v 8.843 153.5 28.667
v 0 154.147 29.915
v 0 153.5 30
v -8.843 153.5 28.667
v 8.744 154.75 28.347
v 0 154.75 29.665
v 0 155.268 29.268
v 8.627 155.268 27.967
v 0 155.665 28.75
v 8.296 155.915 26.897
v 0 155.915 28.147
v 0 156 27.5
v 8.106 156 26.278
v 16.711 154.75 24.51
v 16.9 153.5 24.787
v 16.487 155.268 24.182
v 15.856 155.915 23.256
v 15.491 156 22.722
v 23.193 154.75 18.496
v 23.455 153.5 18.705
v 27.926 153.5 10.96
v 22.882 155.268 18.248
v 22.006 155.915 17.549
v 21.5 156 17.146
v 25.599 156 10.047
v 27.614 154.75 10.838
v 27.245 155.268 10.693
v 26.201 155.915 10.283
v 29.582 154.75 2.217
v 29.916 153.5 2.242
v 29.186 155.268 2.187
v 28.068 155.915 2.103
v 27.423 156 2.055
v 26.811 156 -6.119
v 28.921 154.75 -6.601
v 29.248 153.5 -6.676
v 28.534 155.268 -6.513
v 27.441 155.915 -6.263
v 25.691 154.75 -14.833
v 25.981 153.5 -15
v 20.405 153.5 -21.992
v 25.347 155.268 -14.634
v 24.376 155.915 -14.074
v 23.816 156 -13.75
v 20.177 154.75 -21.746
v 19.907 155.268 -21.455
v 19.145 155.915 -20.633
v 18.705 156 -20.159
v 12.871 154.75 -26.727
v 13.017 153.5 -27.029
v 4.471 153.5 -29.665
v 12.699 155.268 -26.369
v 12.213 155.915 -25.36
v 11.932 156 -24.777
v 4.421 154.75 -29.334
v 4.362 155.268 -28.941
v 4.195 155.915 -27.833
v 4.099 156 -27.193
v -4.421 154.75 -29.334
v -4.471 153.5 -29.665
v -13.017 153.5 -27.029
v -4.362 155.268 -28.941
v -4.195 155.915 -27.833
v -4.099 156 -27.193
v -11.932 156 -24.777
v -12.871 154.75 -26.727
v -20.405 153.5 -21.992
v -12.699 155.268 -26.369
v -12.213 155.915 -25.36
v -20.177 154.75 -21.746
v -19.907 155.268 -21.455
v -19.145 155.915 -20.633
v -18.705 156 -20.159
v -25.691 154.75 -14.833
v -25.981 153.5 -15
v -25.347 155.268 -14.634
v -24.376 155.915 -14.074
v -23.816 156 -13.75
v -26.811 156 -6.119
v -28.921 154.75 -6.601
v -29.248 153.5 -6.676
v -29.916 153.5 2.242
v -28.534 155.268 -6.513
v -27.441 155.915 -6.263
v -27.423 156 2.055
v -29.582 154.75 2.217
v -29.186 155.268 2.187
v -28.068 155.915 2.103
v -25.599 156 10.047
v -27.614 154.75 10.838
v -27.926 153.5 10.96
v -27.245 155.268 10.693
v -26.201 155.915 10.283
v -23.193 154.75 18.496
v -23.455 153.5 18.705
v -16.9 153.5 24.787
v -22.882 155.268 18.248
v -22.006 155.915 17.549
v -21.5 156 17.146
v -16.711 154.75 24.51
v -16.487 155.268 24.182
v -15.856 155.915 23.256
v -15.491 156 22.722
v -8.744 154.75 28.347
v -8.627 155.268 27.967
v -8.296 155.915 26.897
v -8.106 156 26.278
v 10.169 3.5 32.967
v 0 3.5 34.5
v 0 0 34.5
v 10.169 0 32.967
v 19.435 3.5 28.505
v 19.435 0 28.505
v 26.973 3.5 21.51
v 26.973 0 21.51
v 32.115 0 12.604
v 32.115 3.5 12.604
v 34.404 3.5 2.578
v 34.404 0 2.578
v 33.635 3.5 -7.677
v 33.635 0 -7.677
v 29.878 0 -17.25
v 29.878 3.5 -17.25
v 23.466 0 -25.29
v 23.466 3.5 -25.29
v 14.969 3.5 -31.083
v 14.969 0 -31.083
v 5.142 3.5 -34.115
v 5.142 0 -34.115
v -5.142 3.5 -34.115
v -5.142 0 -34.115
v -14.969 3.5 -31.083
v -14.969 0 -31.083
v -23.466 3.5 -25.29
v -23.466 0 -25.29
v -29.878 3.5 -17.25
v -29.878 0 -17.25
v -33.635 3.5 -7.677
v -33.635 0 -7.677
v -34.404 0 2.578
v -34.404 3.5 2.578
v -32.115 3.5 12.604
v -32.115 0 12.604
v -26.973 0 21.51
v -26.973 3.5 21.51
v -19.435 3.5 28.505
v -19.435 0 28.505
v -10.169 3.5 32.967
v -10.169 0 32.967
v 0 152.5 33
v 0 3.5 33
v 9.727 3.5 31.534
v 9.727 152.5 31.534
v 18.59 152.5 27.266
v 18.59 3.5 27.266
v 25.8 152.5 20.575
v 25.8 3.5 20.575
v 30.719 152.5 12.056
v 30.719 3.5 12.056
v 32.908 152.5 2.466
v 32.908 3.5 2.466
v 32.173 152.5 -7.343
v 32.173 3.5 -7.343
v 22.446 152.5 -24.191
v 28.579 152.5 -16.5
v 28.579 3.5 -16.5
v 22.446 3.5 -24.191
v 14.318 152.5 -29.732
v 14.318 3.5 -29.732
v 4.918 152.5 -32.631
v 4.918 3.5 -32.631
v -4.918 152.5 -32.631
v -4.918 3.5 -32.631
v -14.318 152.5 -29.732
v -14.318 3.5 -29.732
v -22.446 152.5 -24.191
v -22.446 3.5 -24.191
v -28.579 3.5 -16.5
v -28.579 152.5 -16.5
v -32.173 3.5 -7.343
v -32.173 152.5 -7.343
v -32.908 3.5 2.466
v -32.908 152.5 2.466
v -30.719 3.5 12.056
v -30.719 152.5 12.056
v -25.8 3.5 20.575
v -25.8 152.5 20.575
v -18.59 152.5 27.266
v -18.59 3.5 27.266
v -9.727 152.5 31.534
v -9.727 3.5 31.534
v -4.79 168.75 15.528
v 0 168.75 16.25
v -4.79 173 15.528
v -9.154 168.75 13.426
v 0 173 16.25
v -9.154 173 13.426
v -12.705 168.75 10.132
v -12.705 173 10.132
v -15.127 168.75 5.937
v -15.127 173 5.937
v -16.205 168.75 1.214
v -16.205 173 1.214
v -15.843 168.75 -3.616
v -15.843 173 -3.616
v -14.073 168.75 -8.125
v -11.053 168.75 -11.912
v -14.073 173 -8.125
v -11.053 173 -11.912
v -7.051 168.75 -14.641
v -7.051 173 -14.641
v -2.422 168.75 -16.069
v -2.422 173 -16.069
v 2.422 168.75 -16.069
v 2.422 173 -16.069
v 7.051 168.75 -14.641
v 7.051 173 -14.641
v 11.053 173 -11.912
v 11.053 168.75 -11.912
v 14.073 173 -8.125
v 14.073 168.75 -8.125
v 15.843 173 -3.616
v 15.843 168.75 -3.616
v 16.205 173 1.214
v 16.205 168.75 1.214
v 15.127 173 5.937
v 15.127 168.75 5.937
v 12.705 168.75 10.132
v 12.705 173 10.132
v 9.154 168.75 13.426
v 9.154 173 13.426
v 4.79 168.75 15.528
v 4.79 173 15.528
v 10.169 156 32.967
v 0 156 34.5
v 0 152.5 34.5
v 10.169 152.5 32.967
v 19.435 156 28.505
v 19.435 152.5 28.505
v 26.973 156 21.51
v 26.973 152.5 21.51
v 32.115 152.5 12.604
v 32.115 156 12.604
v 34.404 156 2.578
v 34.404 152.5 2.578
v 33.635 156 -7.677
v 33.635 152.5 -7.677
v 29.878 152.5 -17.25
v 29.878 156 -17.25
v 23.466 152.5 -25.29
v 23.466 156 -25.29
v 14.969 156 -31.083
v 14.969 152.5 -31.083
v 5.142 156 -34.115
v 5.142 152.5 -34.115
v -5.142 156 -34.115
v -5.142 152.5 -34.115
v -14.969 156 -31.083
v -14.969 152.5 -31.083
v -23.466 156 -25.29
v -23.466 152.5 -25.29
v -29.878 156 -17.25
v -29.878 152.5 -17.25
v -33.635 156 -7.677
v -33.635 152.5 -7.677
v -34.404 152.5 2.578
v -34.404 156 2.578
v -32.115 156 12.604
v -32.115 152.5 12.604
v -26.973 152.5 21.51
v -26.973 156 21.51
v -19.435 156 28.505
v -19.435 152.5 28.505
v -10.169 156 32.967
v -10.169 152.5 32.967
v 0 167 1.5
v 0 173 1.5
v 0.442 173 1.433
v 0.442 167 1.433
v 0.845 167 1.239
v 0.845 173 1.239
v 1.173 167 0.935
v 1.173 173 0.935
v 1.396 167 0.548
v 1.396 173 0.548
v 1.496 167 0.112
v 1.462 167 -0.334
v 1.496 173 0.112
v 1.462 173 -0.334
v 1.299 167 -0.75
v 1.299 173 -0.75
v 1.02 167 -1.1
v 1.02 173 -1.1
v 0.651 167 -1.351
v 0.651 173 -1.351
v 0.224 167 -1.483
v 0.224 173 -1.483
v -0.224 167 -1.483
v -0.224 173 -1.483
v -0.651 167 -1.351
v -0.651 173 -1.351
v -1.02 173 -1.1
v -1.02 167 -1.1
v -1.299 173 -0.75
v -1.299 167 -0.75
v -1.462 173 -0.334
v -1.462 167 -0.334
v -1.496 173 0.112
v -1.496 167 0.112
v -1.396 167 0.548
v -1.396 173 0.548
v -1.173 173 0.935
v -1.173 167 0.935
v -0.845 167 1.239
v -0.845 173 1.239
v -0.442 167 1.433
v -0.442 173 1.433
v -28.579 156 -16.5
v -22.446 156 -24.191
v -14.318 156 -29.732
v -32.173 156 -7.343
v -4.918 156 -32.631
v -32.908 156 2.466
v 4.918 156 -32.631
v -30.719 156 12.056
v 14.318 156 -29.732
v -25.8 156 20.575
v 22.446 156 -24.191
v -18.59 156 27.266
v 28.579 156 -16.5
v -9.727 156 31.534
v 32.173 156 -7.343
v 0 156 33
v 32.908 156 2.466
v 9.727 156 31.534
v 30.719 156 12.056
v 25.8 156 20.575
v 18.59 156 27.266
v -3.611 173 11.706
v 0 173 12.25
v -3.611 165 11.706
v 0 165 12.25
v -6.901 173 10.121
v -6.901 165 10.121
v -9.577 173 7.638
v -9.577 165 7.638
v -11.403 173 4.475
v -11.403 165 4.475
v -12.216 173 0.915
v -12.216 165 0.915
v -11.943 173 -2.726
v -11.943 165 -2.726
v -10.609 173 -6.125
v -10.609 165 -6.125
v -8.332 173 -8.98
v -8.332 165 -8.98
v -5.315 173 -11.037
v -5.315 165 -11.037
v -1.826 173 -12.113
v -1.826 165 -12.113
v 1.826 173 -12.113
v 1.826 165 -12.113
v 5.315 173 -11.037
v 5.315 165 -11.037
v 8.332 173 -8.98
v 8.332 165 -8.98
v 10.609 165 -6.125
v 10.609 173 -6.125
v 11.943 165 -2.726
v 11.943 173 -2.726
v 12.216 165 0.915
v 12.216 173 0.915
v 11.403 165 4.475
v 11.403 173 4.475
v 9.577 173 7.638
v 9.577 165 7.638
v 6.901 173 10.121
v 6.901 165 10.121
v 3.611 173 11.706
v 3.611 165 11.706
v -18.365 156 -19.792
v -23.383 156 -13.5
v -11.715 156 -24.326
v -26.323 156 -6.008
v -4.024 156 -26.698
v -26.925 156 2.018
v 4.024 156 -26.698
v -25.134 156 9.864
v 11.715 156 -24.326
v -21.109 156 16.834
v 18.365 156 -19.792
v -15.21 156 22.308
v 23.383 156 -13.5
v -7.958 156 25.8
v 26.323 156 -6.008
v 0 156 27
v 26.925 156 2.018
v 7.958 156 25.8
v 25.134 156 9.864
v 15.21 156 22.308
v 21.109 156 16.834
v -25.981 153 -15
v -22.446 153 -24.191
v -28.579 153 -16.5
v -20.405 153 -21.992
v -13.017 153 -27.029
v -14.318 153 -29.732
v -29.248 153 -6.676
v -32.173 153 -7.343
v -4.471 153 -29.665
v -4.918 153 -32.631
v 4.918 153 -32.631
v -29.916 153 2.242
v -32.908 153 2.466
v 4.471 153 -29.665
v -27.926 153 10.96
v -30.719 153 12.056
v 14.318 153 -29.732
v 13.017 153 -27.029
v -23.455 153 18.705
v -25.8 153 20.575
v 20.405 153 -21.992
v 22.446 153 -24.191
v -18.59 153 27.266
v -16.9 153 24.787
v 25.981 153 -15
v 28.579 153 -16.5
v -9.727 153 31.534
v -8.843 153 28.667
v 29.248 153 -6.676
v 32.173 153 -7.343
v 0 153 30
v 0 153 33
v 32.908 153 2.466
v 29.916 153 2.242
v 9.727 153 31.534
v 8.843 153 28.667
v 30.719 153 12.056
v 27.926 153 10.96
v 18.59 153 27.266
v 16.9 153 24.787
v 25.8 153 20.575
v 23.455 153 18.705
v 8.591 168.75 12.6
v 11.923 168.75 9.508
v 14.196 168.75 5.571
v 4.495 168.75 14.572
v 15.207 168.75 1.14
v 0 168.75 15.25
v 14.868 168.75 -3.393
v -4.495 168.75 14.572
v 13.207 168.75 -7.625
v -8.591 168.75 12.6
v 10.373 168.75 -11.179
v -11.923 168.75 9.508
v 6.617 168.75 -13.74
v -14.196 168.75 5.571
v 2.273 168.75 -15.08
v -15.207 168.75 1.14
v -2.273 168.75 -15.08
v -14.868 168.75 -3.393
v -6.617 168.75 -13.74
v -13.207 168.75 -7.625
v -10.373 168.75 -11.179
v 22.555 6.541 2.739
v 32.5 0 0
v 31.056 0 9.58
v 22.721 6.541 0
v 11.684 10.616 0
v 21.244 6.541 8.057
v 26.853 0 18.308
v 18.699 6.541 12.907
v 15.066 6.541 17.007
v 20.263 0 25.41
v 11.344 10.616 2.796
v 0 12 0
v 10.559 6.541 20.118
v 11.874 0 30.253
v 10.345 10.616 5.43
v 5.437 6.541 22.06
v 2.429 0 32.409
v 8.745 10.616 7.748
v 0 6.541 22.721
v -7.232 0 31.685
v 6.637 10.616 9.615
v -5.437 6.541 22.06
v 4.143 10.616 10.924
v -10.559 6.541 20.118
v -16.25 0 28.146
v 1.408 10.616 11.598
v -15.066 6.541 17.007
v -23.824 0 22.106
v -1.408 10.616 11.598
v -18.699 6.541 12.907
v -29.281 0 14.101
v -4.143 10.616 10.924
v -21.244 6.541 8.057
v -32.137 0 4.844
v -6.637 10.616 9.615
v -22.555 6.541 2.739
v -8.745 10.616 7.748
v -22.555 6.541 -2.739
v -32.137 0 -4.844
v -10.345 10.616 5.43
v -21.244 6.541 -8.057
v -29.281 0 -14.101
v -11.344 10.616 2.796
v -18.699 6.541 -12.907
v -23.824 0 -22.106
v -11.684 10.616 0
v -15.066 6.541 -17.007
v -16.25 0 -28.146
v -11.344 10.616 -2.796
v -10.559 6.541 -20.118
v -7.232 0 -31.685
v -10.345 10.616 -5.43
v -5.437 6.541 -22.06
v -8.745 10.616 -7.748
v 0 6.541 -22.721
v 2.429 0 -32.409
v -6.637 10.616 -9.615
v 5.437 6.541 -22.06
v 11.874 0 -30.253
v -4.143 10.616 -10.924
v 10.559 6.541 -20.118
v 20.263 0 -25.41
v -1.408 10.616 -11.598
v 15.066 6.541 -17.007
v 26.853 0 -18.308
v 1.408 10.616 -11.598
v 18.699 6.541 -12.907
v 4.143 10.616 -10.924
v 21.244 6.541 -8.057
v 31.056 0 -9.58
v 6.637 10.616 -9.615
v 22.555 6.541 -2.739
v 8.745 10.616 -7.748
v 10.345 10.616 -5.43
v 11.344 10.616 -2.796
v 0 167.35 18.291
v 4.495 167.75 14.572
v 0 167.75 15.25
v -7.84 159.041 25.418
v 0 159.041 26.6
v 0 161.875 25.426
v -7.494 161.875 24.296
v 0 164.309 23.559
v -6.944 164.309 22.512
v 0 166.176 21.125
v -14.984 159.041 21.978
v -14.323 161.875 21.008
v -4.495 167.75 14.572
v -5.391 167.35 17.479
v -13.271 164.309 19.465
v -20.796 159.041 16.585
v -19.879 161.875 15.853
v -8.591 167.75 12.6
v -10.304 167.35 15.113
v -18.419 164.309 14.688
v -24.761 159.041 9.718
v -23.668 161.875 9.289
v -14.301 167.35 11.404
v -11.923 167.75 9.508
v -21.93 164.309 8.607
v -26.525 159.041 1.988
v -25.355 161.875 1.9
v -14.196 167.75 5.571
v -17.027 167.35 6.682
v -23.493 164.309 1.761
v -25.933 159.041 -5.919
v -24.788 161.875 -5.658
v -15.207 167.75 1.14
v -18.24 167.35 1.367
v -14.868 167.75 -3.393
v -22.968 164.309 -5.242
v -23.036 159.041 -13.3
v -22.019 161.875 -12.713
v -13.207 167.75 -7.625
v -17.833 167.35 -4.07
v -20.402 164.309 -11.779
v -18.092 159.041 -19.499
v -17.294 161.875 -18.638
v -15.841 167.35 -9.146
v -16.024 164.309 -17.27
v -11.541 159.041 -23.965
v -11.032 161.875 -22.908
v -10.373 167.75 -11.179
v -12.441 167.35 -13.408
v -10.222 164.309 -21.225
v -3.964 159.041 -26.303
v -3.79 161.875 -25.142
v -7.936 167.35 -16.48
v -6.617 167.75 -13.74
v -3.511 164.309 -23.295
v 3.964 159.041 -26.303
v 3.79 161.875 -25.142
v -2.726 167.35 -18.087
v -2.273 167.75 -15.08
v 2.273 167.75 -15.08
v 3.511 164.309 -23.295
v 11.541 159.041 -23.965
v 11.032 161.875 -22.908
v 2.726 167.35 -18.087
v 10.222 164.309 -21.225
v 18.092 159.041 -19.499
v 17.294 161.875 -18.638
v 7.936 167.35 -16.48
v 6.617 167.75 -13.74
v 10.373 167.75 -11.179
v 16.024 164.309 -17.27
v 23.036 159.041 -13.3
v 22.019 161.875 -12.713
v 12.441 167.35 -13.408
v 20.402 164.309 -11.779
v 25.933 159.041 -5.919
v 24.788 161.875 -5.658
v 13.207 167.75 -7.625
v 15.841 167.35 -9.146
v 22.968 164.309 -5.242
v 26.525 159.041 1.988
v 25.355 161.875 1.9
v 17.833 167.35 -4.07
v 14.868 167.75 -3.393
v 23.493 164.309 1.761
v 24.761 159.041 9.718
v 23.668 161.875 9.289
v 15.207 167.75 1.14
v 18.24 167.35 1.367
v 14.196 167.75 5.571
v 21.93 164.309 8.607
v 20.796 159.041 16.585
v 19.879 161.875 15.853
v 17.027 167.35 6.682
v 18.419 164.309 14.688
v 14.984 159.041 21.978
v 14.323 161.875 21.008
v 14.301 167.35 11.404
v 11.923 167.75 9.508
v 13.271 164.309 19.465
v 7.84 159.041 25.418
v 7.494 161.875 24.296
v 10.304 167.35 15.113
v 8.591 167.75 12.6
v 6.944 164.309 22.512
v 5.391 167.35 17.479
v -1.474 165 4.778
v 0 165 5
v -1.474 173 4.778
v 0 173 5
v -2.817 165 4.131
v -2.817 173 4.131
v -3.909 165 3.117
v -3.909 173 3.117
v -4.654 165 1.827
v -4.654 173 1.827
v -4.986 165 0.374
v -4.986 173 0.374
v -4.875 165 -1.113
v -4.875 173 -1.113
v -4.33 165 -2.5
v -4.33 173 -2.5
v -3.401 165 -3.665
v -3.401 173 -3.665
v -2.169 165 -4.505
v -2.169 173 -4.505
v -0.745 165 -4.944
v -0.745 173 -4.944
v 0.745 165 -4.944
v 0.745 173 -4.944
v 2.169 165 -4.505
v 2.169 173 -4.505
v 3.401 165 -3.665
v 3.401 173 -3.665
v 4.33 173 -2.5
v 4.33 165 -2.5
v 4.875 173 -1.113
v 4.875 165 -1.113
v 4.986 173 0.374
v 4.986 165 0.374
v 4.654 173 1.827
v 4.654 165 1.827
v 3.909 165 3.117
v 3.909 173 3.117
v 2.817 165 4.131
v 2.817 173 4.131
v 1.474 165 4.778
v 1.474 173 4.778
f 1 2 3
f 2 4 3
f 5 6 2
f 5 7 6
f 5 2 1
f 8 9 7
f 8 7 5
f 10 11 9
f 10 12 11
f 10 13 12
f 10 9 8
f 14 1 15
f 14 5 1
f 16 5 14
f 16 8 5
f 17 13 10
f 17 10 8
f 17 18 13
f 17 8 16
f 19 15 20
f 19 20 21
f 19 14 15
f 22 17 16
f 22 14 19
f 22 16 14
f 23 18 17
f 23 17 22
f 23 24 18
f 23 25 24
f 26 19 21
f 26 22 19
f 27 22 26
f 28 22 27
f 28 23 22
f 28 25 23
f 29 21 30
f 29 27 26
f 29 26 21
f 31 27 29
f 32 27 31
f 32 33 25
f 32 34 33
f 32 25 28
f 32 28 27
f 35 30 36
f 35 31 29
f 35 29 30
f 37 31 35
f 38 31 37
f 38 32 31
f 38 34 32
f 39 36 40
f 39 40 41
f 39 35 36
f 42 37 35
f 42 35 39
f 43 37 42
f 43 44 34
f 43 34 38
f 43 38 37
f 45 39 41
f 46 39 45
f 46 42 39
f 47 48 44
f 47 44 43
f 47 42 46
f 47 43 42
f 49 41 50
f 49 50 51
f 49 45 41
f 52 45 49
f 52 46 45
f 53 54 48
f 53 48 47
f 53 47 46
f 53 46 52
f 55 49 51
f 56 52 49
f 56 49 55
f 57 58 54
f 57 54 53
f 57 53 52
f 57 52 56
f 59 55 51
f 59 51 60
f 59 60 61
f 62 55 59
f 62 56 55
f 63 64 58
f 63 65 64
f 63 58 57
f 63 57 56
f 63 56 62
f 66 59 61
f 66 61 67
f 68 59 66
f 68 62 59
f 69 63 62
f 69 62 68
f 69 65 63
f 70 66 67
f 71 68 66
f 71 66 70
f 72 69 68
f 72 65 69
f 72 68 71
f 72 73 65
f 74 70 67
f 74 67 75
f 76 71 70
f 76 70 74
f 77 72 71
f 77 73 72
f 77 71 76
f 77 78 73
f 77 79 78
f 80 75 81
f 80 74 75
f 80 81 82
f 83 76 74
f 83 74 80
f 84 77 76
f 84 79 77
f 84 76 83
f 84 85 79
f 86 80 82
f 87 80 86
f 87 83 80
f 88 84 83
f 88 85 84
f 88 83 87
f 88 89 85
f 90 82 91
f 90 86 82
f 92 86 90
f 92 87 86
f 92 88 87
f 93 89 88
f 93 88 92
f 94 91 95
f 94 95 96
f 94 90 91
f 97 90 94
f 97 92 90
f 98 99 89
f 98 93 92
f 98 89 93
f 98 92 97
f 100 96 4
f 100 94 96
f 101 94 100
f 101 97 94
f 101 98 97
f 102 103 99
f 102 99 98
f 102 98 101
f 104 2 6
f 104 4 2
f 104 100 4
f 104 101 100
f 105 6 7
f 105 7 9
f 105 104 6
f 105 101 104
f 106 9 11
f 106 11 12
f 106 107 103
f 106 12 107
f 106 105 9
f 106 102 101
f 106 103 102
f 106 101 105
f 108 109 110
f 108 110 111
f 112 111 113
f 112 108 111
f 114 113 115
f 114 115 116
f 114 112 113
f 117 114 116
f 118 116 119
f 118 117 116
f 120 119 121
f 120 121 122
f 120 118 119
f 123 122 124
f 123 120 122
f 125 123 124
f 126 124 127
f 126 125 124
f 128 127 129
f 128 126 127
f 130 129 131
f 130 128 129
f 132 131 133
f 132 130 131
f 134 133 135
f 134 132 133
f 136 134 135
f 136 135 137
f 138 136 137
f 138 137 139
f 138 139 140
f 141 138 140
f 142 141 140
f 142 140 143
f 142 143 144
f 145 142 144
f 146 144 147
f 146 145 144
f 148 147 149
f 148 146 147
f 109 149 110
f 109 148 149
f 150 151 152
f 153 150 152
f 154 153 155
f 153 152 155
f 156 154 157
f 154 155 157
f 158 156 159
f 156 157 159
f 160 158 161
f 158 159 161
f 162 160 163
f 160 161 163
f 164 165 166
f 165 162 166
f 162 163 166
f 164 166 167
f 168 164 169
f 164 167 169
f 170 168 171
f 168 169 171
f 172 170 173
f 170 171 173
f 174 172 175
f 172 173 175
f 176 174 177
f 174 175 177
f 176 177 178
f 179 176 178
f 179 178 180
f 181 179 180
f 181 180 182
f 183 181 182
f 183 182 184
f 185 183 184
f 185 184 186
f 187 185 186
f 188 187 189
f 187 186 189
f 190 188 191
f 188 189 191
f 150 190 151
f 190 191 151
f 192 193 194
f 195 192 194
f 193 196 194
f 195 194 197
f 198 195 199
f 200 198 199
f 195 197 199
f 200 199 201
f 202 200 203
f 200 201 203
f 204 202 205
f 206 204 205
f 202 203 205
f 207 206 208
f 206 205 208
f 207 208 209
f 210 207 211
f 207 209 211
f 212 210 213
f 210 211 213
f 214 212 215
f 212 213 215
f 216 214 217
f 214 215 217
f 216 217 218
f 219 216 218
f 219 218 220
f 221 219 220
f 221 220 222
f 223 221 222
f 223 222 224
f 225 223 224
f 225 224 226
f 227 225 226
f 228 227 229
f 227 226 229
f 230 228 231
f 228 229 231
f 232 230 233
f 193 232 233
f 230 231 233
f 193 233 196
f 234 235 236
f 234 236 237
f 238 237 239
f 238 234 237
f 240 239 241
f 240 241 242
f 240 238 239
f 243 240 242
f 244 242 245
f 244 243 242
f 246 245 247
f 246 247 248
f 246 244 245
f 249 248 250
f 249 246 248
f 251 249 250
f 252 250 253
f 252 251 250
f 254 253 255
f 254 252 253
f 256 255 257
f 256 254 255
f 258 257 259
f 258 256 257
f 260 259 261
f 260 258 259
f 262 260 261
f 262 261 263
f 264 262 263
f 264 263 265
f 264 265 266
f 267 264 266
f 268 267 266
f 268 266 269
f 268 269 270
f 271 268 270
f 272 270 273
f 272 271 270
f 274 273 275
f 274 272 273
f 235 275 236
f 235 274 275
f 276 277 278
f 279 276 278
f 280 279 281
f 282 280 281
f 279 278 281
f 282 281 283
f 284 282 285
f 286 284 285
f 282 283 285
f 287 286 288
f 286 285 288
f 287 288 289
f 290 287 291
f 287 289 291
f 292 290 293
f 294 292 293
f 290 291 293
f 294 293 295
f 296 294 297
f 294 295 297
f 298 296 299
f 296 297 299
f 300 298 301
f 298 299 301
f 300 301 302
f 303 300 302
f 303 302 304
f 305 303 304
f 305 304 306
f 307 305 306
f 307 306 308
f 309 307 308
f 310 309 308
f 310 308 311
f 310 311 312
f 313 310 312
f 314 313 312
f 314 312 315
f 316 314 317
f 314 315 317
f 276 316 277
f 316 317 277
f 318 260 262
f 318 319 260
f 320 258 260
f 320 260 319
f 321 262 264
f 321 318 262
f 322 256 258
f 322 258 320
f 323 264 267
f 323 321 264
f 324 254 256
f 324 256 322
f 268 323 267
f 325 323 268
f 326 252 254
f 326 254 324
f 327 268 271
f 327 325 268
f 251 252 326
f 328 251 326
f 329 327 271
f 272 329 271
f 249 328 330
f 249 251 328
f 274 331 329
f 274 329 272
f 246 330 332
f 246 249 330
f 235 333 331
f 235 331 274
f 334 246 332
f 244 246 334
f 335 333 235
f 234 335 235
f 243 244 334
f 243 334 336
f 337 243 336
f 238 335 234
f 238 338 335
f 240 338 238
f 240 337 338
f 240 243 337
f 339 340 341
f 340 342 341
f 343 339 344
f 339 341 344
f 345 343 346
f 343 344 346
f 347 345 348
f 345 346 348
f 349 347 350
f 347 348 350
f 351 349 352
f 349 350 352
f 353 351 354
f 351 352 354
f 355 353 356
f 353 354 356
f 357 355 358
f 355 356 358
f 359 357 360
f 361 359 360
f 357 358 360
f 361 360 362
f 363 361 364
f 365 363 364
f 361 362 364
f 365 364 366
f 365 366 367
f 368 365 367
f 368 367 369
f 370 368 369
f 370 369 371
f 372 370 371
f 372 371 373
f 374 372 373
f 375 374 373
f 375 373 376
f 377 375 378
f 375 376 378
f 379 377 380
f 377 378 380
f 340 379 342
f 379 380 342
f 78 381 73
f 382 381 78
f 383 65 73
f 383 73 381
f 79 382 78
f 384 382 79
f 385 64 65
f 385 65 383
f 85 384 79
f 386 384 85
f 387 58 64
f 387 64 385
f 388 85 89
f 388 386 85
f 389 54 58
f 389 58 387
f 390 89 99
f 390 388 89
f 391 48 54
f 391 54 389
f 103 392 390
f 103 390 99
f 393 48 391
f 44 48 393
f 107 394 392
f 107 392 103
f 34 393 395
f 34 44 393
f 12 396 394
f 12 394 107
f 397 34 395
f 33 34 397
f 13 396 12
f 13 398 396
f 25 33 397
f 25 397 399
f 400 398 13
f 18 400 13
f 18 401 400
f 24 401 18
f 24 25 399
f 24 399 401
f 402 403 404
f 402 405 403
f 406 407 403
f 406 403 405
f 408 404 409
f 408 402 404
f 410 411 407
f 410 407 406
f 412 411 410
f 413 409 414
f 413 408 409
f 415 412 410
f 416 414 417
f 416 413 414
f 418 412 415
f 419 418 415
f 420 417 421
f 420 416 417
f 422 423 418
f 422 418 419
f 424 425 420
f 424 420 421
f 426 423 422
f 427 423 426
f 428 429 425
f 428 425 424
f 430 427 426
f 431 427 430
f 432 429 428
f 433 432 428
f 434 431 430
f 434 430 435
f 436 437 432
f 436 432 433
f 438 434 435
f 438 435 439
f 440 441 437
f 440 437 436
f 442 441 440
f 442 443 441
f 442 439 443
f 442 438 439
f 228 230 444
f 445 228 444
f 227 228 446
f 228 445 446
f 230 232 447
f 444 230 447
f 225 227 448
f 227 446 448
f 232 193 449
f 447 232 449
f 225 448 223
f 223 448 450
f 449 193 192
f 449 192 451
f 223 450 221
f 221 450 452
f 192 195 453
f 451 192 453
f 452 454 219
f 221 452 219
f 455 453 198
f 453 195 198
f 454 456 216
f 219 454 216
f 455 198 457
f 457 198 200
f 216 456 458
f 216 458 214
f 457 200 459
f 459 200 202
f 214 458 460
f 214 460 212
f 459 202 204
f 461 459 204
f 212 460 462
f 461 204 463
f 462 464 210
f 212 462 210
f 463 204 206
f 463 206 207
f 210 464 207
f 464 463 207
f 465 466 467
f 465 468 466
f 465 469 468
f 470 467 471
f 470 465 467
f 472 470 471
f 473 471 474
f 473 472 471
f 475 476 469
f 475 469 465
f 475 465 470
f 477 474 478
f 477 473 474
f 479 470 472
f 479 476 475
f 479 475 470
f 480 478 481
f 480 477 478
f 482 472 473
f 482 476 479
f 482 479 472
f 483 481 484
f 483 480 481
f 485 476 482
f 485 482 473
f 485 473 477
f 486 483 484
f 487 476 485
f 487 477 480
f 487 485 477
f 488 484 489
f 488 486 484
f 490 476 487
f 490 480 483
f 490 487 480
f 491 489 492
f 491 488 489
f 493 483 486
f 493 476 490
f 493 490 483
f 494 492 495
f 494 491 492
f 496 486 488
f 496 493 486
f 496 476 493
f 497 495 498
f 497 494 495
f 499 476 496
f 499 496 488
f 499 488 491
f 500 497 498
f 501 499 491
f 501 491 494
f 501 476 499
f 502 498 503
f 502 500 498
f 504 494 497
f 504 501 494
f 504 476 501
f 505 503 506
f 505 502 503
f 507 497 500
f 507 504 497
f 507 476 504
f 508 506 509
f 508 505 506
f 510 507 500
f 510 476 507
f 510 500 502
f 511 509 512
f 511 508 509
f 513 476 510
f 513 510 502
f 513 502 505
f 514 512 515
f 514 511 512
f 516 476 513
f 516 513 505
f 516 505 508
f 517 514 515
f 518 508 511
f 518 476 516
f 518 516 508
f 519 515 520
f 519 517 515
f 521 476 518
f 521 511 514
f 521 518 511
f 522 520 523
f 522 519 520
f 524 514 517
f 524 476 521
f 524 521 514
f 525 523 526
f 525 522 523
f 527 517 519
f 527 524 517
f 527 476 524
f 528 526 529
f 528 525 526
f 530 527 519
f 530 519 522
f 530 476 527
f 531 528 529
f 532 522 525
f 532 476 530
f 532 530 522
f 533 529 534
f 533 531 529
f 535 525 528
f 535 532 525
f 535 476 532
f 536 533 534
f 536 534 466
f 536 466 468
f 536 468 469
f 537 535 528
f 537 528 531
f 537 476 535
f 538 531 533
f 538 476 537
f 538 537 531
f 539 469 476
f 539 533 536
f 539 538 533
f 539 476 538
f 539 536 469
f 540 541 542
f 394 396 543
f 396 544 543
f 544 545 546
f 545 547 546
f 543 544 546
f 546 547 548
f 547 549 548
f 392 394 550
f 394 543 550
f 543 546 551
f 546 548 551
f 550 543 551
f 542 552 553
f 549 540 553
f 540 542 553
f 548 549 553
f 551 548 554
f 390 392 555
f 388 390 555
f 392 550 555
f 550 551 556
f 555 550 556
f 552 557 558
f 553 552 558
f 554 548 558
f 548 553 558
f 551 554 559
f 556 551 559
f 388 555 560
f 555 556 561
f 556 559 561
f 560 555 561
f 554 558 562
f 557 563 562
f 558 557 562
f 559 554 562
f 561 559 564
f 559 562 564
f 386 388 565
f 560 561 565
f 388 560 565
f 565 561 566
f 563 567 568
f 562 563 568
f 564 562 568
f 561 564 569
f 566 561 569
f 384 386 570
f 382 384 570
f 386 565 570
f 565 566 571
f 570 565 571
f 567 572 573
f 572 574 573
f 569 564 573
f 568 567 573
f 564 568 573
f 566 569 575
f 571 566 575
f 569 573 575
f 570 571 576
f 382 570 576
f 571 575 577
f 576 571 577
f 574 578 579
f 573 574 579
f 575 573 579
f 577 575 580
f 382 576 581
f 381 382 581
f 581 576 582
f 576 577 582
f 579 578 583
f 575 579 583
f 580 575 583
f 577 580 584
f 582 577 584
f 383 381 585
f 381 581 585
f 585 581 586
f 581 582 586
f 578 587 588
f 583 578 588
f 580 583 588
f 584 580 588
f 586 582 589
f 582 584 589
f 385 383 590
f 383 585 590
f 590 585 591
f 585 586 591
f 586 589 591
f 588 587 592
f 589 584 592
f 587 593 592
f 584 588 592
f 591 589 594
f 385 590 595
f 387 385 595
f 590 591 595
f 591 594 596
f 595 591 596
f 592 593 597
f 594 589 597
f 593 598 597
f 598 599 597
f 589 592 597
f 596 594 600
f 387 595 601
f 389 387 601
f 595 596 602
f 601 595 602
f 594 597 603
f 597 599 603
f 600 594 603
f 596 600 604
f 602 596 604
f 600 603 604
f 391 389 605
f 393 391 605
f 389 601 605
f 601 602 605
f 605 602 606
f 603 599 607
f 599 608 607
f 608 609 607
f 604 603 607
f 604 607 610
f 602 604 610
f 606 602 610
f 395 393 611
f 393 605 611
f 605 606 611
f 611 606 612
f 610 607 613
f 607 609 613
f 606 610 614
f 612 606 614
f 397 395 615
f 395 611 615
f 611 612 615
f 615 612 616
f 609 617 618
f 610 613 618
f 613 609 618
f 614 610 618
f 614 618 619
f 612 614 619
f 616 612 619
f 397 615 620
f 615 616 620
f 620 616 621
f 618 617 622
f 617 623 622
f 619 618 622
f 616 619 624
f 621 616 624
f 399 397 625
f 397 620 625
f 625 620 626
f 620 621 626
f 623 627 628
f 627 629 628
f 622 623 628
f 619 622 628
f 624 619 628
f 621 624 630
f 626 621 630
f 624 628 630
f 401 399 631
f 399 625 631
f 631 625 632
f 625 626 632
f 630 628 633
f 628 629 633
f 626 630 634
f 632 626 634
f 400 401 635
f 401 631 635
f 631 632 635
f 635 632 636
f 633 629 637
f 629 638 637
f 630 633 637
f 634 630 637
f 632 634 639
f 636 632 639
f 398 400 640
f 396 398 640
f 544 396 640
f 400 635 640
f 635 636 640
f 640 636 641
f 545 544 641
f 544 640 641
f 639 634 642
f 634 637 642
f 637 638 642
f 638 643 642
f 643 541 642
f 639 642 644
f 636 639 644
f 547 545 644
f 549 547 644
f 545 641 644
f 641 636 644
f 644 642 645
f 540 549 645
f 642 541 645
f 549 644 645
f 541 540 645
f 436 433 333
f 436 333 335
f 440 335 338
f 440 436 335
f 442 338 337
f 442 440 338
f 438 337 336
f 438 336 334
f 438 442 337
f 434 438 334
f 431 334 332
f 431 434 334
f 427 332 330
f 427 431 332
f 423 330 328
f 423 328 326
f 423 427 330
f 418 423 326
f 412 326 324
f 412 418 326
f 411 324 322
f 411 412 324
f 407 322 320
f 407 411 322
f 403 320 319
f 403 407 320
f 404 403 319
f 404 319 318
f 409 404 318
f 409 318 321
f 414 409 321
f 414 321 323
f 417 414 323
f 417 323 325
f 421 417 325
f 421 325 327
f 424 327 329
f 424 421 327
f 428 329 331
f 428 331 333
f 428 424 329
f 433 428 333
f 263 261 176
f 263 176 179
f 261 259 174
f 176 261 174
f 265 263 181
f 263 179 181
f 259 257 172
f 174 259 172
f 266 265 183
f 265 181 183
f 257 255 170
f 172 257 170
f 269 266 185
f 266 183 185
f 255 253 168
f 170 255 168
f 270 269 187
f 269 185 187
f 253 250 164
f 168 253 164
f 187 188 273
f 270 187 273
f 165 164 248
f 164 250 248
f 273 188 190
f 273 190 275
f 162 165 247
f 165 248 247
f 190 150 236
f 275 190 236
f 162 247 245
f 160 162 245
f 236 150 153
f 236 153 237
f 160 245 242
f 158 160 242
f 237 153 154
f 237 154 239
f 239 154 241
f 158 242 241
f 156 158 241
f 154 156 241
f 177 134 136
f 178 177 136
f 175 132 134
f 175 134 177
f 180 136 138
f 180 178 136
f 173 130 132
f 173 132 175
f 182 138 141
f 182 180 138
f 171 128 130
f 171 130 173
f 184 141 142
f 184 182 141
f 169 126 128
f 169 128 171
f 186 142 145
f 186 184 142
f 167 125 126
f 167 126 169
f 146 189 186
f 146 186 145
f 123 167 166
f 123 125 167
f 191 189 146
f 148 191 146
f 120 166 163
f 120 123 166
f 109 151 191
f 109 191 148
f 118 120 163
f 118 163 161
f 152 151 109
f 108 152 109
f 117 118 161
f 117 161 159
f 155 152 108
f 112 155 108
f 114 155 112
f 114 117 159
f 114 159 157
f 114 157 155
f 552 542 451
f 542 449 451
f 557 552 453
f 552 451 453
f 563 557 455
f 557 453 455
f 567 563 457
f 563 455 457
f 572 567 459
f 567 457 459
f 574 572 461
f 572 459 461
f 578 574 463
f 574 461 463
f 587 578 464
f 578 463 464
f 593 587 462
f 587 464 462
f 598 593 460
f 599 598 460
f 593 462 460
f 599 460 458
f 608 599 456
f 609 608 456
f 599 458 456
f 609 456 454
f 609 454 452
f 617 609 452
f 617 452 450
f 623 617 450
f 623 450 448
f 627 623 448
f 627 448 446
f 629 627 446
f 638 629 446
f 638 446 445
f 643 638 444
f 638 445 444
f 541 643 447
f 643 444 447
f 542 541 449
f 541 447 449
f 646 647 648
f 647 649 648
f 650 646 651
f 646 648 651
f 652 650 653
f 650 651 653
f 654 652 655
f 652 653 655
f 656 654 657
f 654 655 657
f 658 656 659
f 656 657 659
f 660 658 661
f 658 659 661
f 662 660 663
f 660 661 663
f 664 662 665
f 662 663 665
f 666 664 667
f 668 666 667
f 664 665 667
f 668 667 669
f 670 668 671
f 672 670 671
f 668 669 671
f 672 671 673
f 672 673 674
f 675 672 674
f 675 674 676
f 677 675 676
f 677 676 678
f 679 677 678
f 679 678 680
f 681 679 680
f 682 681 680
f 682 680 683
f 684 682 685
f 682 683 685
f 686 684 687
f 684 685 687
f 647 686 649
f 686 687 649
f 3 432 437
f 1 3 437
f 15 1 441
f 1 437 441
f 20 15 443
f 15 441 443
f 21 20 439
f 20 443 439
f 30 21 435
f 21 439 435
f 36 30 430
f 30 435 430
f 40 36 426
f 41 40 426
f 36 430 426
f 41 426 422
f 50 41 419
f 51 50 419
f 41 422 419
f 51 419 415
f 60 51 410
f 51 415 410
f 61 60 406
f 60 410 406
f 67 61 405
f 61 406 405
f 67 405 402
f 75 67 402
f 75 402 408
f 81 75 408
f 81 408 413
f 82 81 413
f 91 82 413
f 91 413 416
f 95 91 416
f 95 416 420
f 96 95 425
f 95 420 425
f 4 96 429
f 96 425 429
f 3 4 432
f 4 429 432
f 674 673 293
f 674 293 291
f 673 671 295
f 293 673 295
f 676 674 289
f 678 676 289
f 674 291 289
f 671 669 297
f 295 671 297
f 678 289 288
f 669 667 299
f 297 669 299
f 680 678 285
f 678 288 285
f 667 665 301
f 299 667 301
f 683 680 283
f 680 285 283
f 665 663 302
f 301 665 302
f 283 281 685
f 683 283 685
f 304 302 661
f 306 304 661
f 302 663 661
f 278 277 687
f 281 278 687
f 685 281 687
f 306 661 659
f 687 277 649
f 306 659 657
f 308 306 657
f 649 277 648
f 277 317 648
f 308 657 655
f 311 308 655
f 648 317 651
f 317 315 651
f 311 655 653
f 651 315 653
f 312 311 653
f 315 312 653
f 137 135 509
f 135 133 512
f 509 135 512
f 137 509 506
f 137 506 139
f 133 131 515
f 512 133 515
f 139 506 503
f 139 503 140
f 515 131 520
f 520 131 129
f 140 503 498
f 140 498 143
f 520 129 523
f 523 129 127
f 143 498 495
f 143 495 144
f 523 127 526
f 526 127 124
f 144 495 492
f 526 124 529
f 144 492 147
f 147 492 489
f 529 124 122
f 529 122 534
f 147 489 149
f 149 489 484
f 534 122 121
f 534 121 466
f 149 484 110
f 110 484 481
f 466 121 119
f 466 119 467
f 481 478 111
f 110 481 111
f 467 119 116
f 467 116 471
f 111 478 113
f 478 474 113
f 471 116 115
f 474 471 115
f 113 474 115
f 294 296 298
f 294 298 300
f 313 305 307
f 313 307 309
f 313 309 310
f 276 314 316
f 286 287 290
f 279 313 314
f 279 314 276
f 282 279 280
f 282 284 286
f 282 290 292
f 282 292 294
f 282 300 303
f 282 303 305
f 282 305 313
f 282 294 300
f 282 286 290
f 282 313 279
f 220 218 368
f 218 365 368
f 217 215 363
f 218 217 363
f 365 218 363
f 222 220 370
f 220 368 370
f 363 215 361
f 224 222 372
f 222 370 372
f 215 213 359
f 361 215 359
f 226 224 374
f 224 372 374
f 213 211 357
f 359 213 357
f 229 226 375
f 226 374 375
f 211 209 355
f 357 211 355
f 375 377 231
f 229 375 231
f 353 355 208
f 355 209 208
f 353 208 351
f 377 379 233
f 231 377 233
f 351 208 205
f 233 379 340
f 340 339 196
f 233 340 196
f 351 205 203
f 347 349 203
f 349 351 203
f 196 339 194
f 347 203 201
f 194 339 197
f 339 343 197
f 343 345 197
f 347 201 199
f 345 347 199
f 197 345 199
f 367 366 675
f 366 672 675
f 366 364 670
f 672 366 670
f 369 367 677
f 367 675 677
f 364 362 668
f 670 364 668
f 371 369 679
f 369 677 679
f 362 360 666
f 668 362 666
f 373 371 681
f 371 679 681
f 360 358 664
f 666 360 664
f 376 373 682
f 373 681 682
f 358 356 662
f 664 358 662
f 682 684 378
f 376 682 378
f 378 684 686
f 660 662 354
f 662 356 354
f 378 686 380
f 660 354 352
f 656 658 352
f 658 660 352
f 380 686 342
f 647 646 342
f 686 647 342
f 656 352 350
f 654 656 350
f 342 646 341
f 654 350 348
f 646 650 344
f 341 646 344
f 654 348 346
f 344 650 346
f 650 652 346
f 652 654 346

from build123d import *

# Parameters (mm, degrees)
SKETCH1_R           = 33
BOSS_EXTRUDE1_DEPTH = 156
SKETCH3_R           = 34.5
BOSS_EXTRUDE2_DEPTH = 3.5
LPATTERN1_COUNT     = 2
LPATTERN1_PITCH     = 152.5
SKETCH6_R           = 1.5
CUT_EXTRUDE1_DEPTH  = 6
CUT_EXTRUDE2_START  = -3
SKETCH7_R           = 33
SKETCH7_R_2         = 30
CUT_EXTRUDE2_DEPTH  = 3
FILLET1_R           = 2.5


with BuildPart() as part:
    # Sketch1 → Boss-Extrude1 (new body)
    with BuildSketch(Plane(origin=(0, 0, 0), x_dir=(1, 0, 0), z_dir=(0, 1, 0))):
        with Locations(Location((0, 0, 0), (0, 0, 270))):
            Circle(SKETCH1_R)
    extrude(amount=BOSS_EXTRUDE1_DEPTH)

    # Sketch2 → Revolve1 (revolve)
    with BuildSketch(Plane(origin=(0, 0, 0), x_dir=(0, 0, -1), z_dir=(1, 0, 0)), mode=Mode.PRIVATE) as revolve1_sk:
        with BuildLine():
            Line((15.25, 167.75), (15.25, 168.75))
            Line((15.25, 168.75), (16.25, 168.75))
            Line((16.25, 168.75), (16.25, 173))
            Line((16.25, 173), (12.25, 173))
            Line((12.25, 173), (12.25, 165))
            Line((12.25, 165), (5, 165))
            Line((5, 165), (5, 173))
            Line((5, 173), (0, 173))
            Line((0, 173), (0, 156))
            Line((0, 156), (27, 156))
            ThreePointArc((27, 156), (23.558504679, 164.308504679), (15.25, 167.75))
        make_face()
    revolve(revolve1_sk.sketch.rotate(Axis((0, 173, 0), (0, -1, 0)), 180), axis=Axis((0, 173, 0), (0, -1, 0)))

    # Sketch3 → Boss-Extrude2 (add)
    with BuildSketch(Plane(origin=(0, 156, 0), x_dir=(1, 0, 0), z_dir=(0, 1, 0))):
        with Locations(Location((0, 0, 0), (0, 0, 270))):
            Circle(SKETCH3_R)
    boss_extrude2 = extrude(amount=-BOSS_EXTRUDE2_DEPTH)

    # LPattern1: Boss-Extrude2 ×2
    with Locations(*[(0, -i * LPATTERN1_PITCH, 0) for i in range(1, LPATTERN1_COUNT)]):
        add(boss_extrude2)

    # Sketch5 → Cut-Revolve1 (revolve, cut)
    with BuildSketch(Plane.XY, mode=Mode.PRIVATE) as cut_revolve1_sk:
        with BuildLine():
            Line((0, 0), (-32.5, 0))
            ThreePointArc((-32.5, 0), (-17.322312201, 8.904178879), (0, 12))
            Line((0, 12), (0, 0))
        make_face()
    revolve(cut_revolve1_sk.sketch.rotate(Axis((0, 12, 0), (0, -1, 0)), 180), axis=Axis((0, 12, 0), (0, -1, 0)), mode=Mode.SUBTRACT)

    # Sketch6 → Cut-Extrude1 (cut)
    with BuildSketch(Plane(origin=(0, 173, 0), x_dir=(1, 0, 0), z_dir=(0, 1, 0))):
        with Locations(Location((0, 0, 0), (0, 0, 270))):
            Circle(SKETCH6_R)
    extrude(amount=-CUT_EXTRUDE1_DEPTH, mode=Mode.SUBTRACT)

    # Sketch7 → Cut-Extrude2 (cut)
    with BuildSketch(Plane(origin=(0, 156, 0), x_dir=(1, 0, 0), z_dir=(0, 1, 0)).offset(CUT_EXTRUDE2_START)):
        with Locations(Location((0, 0, 0), (0, 0, 270))):
            Circle(SKETCH7_R)
        with Locations(Location((0, 0, 0), (0, 0, 270))):
            Circle(SKETCH7_R_2, mode=Mode.SUBTRACT)
    extrude(amount=CUT_EXTRUDE2_DEPTH, mode=Mode.SUBTRACT)

    # Fillet1
    fillet1_edges = [part.edges().sort_by_distance(p)[0] for p in [
        (0, 156, -30),
    ]]
    fillet(fillet1_edges, radius=FILLET1_R)


solid = part.part
